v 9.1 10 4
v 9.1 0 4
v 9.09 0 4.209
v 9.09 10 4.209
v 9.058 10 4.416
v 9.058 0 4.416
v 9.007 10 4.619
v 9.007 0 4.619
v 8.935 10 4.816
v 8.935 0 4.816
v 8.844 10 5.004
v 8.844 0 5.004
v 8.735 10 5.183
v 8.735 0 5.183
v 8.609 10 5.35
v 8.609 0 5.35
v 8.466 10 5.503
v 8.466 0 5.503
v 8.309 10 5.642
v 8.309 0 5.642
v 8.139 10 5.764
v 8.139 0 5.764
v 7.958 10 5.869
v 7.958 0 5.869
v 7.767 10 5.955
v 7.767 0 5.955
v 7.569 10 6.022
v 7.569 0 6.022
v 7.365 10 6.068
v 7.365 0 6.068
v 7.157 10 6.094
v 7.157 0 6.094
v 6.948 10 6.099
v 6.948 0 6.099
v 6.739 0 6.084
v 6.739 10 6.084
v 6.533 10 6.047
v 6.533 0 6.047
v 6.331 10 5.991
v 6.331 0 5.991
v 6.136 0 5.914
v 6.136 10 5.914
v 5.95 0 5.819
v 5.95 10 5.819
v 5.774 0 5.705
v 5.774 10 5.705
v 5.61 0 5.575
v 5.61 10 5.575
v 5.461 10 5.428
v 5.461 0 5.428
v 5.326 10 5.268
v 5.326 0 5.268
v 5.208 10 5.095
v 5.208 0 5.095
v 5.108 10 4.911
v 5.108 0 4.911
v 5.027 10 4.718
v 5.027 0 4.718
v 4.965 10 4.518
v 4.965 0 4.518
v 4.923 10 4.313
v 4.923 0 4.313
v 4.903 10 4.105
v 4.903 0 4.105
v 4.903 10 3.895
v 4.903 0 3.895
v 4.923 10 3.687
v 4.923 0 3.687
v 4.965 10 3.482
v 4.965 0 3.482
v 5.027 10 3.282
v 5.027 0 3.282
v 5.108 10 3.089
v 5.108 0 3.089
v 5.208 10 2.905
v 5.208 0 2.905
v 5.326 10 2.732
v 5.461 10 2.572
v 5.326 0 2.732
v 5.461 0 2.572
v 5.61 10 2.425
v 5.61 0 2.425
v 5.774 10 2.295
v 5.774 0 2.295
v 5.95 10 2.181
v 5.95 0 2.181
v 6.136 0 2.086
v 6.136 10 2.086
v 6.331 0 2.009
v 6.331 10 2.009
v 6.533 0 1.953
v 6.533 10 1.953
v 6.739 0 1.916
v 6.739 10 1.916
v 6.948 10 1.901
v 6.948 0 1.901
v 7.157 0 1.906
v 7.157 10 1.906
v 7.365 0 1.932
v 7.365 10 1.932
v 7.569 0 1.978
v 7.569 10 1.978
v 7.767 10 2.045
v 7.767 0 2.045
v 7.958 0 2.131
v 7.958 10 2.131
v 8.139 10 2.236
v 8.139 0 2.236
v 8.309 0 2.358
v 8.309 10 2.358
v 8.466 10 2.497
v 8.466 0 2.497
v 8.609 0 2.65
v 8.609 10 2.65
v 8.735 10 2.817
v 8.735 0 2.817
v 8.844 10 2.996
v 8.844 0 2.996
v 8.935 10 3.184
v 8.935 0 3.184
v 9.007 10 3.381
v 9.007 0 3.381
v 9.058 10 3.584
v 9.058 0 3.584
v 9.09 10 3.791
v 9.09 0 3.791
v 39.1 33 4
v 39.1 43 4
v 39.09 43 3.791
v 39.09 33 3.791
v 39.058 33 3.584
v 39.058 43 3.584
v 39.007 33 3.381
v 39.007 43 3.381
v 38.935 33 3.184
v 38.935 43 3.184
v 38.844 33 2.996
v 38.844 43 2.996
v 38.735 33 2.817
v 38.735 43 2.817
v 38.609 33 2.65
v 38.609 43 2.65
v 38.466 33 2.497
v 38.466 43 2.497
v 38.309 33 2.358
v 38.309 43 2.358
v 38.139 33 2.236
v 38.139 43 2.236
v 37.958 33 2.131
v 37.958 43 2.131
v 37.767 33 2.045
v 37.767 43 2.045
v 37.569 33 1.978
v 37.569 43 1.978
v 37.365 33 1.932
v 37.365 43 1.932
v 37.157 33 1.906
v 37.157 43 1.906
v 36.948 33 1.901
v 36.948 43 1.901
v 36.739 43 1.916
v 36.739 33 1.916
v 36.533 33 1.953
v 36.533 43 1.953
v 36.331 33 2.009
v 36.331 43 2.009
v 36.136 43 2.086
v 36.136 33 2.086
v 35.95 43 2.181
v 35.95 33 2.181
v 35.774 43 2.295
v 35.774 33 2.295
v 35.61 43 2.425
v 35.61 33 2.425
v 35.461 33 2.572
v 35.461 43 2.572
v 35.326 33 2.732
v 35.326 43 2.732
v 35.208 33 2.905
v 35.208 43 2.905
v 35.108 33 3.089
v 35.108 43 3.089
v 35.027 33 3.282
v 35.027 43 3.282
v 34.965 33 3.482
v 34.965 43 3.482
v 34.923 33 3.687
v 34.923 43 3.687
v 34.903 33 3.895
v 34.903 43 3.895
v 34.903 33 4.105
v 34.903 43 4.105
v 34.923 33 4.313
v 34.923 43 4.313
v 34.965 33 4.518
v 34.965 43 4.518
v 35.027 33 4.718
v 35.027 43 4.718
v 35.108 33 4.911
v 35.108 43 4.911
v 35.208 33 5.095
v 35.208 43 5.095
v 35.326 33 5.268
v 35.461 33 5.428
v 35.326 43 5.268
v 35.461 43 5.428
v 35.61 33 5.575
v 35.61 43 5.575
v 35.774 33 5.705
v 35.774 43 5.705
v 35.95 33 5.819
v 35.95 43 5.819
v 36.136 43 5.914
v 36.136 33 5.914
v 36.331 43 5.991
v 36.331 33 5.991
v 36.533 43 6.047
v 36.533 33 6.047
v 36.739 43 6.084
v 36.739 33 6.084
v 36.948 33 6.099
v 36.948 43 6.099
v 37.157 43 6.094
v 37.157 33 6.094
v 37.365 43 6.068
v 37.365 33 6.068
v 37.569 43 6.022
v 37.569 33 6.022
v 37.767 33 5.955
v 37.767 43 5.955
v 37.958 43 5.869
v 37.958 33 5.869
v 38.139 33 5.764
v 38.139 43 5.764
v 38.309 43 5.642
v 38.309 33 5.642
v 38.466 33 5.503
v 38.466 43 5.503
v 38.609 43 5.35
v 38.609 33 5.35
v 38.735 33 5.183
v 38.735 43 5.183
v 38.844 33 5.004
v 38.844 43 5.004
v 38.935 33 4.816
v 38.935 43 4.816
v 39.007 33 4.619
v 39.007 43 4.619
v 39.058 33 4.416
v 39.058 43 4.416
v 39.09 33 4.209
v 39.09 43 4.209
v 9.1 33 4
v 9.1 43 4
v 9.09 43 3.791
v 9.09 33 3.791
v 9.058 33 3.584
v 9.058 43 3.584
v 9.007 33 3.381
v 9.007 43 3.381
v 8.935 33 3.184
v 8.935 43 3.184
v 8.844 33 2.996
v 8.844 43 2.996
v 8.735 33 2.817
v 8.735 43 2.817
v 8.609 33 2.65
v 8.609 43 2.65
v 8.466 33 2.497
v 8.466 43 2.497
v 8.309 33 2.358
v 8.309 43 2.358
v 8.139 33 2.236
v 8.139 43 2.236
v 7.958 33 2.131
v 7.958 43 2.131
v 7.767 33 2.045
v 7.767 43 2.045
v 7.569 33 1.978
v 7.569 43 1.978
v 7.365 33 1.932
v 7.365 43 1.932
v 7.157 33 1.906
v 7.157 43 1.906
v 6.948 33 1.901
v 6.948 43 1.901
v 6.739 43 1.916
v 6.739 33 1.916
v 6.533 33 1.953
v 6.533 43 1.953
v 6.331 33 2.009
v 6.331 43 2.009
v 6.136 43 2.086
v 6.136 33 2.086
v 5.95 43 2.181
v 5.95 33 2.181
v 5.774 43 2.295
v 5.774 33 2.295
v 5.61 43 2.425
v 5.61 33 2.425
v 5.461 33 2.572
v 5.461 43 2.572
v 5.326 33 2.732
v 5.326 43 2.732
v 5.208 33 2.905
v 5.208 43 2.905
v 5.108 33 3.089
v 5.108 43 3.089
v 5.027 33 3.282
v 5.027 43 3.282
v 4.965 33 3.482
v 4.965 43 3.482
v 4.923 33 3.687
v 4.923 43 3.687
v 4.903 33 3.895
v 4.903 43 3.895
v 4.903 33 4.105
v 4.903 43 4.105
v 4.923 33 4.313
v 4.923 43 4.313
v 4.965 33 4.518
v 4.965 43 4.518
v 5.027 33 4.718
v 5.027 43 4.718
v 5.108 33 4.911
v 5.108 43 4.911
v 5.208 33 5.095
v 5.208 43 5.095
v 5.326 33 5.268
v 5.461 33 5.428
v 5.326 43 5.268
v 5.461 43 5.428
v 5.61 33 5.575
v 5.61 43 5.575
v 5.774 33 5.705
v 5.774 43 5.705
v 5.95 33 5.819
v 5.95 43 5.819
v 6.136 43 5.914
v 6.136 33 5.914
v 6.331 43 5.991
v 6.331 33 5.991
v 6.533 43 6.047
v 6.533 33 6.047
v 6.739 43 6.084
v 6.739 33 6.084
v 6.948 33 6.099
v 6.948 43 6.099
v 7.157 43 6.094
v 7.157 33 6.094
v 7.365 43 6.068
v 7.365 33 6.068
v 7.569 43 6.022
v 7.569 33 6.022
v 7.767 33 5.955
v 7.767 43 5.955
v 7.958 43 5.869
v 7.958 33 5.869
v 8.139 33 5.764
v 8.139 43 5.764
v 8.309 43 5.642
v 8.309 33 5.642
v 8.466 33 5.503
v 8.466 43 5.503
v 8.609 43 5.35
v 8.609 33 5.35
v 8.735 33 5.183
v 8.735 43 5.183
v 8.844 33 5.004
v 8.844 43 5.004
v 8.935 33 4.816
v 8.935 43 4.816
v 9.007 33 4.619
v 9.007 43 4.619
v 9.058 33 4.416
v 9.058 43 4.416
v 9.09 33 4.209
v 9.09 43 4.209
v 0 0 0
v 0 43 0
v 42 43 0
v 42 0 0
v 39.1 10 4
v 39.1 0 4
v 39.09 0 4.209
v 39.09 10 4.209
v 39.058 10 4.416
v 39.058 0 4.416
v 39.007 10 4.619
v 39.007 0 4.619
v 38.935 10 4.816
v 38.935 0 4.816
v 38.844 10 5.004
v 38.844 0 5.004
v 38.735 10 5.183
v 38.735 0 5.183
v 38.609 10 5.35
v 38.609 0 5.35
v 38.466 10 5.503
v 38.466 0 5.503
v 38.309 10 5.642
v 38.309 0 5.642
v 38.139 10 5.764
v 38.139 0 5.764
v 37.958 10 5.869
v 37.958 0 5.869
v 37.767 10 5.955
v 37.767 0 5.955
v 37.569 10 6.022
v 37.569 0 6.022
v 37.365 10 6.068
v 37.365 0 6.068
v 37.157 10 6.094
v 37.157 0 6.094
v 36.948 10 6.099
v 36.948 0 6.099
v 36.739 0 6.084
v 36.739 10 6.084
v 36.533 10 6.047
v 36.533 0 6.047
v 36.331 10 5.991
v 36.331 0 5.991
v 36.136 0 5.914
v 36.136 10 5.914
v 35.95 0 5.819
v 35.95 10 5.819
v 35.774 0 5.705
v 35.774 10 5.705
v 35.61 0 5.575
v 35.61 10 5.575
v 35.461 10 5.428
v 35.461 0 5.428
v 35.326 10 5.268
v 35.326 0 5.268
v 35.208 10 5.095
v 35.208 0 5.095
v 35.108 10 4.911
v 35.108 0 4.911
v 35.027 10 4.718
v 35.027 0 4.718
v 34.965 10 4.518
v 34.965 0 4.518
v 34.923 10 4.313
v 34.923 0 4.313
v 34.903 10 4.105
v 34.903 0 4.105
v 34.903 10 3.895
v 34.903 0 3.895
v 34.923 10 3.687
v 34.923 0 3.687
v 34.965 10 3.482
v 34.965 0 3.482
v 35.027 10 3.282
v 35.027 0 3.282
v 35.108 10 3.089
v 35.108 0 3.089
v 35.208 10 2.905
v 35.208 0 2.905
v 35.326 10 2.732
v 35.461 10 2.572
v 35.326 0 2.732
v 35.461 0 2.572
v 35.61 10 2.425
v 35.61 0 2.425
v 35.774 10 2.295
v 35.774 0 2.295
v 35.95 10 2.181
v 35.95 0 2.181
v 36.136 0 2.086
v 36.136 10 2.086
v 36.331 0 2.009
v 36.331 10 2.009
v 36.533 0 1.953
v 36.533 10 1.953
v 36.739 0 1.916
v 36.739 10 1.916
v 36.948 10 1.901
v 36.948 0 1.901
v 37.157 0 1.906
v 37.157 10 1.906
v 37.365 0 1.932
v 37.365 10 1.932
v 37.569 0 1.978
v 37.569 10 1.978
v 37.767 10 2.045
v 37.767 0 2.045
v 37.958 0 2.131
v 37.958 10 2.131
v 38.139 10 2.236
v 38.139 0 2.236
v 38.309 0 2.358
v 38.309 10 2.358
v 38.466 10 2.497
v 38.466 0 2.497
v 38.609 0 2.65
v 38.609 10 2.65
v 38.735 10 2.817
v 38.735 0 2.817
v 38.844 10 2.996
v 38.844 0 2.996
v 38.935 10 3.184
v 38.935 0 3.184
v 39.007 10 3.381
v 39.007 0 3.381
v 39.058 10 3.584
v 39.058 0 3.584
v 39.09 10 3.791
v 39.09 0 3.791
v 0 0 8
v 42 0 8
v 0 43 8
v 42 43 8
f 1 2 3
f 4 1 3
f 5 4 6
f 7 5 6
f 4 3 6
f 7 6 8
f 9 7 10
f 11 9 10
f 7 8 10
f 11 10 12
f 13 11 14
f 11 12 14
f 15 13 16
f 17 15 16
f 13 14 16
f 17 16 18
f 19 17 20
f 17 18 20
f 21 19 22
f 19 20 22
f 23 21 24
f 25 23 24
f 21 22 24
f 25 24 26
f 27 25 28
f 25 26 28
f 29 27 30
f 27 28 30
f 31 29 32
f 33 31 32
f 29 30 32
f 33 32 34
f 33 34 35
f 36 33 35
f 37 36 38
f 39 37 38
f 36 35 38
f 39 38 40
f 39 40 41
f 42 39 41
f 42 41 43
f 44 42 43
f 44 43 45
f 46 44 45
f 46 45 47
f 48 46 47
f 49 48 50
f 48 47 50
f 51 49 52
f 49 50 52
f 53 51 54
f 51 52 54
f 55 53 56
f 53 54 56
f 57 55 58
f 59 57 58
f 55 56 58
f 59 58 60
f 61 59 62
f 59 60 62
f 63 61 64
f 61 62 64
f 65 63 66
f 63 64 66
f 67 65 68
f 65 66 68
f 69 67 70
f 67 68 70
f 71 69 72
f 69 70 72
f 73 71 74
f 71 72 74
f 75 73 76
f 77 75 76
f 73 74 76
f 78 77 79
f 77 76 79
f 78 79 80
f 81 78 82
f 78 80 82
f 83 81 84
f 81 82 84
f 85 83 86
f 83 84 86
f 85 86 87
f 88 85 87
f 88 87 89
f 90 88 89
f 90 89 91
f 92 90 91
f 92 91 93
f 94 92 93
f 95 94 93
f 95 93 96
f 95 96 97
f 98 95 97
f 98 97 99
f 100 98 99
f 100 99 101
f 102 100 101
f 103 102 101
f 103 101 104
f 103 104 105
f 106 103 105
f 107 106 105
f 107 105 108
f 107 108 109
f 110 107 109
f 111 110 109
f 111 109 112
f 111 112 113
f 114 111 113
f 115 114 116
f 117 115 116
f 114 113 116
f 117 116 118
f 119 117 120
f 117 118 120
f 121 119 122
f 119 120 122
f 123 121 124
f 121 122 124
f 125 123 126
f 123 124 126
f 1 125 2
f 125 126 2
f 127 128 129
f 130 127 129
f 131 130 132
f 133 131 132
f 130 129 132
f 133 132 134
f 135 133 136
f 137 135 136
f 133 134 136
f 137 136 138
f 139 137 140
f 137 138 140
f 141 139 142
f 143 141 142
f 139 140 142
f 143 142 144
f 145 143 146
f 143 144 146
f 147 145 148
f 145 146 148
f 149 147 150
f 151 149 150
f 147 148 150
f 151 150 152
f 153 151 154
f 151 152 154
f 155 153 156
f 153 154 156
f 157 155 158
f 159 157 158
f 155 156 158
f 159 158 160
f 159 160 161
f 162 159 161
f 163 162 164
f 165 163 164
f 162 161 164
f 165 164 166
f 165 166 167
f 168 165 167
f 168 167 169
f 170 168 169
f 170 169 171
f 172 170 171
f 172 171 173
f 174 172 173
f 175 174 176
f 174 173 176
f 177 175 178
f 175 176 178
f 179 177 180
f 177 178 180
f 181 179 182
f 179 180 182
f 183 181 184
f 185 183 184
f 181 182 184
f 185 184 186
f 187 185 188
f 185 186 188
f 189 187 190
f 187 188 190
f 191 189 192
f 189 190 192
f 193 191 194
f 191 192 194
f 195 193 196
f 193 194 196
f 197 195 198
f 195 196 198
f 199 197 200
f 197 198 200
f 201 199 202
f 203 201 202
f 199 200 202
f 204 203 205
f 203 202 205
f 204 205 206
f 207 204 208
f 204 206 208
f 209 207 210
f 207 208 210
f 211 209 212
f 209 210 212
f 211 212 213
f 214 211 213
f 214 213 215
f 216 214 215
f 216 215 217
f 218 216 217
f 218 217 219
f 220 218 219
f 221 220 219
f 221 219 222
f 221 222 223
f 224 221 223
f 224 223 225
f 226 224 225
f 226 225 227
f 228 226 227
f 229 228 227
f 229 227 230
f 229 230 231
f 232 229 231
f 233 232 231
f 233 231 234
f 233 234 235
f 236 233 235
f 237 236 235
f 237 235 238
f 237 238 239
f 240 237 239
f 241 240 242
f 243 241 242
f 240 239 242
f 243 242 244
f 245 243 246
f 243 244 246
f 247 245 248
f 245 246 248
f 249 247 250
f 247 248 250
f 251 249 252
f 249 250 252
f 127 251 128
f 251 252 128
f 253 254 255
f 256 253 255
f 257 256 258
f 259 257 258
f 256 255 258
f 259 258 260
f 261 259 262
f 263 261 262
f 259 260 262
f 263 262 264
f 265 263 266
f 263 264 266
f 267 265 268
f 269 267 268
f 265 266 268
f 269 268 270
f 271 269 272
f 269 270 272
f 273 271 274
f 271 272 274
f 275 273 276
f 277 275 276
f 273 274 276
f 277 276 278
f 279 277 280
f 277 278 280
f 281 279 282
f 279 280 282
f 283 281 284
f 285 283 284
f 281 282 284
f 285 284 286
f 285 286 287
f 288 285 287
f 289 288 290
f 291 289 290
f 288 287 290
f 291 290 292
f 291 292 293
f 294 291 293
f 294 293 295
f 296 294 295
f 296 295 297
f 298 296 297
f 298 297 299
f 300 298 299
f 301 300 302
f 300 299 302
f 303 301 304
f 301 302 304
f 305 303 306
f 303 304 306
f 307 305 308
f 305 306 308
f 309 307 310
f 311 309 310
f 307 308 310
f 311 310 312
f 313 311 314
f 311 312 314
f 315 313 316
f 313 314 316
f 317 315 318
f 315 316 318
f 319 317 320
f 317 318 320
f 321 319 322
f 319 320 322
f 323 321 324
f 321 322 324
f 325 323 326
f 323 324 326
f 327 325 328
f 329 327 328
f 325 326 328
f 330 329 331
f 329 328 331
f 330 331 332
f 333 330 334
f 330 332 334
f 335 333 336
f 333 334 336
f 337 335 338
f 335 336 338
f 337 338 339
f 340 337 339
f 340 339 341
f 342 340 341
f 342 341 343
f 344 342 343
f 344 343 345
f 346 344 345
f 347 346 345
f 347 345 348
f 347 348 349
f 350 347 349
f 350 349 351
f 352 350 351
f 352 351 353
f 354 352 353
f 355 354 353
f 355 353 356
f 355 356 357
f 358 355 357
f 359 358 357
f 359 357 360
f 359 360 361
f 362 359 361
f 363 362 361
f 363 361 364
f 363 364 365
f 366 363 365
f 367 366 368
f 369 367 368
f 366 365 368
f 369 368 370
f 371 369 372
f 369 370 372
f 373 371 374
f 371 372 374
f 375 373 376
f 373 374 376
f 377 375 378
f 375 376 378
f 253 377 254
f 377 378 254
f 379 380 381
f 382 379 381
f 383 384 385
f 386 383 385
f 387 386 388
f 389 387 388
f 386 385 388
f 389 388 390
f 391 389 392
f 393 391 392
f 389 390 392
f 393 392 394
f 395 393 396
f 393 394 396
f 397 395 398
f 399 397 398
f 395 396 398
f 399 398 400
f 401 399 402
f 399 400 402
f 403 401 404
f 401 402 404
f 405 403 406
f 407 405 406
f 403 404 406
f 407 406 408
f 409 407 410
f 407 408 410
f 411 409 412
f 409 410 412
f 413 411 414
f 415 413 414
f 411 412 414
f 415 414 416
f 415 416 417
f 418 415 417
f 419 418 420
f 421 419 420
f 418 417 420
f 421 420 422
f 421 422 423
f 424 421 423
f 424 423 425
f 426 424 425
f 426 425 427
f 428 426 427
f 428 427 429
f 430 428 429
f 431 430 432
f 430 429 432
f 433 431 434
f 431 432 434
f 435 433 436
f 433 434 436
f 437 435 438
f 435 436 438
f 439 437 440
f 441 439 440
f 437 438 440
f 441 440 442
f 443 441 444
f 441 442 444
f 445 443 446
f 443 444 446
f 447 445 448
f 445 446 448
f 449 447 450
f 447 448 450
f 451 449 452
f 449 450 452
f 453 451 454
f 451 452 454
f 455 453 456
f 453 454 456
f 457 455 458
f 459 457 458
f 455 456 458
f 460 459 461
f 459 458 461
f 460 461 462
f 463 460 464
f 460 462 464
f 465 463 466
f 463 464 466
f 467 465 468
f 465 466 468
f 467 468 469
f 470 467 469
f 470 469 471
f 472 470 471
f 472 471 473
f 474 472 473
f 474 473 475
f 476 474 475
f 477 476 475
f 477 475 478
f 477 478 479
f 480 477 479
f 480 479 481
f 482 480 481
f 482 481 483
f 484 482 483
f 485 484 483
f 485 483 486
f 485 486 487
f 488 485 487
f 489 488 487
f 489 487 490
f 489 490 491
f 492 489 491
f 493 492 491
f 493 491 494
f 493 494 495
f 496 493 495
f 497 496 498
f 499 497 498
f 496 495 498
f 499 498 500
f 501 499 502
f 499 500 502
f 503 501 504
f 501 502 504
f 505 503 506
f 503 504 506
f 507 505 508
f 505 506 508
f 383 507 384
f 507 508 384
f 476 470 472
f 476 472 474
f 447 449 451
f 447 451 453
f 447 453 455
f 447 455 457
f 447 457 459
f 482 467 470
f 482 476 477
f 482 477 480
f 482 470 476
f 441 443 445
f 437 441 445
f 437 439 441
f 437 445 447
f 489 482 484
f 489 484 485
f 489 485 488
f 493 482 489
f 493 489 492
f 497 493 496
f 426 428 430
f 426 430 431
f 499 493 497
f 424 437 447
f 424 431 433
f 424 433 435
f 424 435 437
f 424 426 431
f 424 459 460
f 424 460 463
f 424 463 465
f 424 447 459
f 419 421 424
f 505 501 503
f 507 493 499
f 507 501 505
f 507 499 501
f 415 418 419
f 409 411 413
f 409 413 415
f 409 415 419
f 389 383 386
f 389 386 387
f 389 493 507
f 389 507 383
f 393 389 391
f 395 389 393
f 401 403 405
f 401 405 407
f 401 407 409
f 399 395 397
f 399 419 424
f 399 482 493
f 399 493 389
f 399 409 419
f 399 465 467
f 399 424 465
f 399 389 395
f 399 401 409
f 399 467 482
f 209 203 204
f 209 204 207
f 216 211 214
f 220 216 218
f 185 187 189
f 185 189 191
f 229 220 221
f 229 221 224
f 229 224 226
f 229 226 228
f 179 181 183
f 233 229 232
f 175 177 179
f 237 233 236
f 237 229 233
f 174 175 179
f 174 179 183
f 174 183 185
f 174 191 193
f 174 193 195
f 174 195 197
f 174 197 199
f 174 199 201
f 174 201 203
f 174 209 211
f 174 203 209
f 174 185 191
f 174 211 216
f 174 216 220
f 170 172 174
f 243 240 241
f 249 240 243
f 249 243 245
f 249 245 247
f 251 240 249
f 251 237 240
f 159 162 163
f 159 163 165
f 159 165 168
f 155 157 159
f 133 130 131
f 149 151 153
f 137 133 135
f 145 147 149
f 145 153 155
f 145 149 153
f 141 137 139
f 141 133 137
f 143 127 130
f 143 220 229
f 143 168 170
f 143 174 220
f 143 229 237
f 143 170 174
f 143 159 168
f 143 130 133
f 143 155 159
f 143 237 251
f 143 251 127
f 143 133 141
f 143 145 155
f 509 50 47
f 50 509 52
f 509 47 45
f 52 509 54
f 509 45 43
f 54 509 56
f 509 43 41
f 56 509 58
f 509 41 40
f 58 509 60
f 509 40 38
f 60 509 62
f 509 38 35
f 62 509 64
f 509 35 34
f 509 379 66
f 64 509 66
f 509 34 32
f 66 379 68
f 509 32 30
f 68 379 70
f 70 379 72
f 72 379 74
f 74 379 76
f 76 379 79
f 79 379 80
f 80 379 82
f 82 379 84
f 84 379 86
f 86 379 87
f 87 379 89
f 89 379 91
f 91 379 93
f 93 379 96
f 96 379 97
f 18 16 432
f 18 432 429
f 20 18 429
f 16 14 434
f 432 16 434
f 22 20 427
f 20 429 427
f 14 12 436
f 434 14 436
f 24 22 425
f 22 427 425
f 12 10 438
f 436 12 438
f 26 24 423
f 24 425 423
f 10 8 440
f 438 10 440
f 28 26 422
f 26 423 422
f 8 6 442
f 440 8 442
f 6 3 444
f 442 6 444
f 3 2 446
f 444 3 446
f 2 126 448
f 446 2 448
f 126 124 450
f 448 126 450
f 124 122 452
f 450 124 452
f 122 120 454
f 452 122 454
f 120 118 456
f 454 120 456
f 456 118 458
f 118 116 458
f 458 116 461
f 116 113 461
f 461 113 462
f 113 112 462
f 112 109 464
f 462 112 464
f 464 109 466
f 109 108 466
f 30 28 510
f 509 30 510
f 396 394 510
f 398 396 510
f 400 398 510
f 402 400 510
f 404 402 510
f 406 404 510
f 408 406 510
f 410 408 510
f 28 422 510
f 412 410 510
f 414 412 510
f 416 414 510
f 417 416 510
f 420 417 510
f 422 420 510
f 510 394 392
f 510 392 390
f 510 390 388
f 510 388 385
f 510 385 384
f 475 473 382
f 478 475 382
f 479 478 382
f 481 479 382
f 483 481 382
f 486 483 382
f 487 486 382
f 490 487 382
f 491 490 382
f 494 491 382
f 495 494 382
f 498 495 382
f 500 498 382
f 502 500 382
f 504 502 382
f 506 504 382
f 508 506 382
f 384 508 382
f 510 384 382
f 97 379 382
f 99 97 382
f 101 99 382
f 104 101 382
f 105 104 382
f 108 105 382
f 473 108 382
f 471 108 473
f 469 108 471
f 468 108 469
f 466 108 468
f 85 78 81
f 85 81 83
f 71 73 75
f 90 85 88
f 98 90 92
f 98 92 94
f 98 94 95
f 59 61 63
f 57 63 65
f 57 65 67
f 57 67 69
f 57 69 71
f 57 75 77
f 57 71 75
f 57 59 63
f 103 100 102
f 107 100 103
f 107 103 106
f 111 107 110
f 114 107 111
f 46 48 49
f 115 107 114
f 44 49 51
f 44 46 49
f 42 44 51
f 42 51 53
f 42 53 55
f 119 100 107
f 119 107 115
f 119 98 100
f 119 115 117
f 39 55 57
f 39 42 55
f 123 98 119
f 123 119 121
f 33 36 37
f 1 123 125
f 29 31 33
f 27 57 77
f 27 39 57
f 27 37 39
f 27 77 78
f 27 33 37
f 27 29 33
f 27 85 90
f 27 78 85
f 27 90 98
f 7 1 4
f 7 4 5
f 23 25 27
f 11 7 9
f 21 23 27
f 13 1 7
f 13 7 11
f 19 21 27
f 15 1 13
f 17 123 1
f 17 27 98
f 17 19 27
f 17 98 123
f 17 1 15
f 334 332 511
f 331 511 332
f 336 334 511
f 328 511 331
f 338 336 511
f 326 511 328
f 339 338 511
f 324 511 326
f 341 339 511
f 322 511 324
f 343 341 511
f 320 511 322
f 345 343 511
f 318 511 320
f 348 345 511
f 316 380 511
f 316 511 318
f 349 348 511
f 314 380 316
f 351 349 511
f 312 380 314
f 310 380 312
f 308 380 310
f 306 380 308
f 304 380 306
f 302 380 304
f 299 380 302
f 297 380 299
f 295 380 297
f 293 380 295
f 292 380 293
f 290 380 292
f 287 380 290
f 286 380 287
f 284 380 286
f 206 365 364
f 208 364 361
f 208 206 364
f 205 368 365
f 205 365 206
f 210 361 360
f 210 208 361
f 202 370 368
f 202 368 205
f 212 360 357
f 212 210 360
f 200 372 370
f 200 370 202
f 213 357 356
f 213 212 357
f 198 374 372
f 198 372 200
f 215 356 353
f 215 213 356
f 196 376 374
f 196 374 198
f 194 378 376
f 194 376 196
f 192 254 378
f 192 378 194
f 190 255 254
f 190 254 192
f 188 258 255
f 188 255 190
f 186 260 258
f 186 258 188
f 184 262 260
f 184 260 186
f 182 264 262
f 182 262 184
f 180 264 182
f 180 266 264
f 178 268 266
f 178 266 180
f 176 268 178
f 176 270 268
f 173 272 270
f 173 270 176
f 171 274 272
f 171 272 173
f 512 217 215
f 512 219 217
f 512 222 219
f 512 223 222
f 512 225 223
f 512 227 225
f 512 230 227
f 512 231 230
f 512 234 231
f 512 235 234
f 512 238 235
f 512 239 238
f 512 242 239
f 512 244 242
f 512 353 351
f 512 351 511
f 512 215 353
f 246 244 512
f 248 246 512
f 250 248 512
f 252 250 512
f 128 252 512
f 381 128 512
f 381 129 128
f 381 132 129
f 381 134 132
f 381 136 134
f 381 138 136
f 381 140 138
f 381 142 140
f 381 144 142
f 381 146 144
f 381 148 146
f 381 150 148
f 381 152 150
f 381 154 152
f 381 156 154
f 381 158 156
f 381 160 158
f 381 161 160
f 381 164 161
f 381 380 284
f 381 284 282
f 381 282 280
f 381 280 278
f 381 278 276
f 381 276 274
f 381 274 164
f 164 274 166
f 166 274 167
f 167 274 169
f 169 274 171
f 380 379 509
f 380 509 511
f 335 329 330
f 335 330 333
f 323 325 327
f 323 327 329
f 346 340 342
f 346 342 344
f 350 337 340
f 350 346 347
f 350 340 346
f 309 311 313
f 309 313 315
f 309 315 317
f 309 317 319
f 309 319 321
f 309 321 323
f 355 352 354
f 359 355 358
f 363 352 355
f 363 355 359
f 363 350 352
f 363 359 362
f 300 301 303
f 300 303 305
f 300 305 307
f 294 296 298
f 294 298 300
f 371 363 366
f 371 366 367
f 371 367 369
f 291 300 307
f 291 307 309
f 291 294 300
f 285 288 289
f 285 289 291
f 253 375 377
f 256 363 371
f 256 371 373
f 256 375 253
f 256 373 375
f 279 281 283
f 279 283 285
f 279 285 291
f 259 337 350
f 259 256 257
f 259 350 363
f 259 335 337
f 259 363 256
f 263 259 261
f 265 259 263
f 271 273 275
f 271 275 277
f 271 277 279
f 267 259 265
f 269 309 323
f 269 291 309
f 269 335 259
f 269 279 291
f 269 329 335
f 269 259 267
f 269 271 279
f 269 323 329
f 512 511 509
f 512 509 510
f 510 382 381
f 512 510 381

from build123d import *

# Parameters (mm, degrees)
SKETCH1_W           = 42
SKETCH1_H           = 43
BOSS_EXTRUDE1_DEPTH = 8
SKETCH2_R           = 2.1
CUT_EXTRUDE1_DEPTH  = 10
SKETCH3_R           = 2.1
CUT_EXTRUDE2_DEPTH  = 10


with BuildPart() as part:
    # Sketch1 → Boss-Extrude1 (new body)
    with BuildSketch(Plane.XY):
        with Locations((21, 21.5)):
            Rectangle(SKETCH1_W, SKETCH1_H)
    extrude(amount=BOSS_EXTRUDE1_DEPTH)

    # Sketch2 → Cut-Extrude1 (cut)
    with BuildSketch(Plane.XZ):
        with Locations((37, 4)):
            Circle(SKETCH2_R)
        with Locations((7, 4)):
            Circle(SKETCH2_R)
    extrude(amount=-CUT_EXTRUDE1_DEPTH, mode=Mode.SUBTRACT)

    # Sketch3 → Cut-Extrude2 (cut)
    with BuildSketch(Plane(origin=(0, 43, 0), x_dir=(1, 0, 0), z_dir=(0, 1, 0))):
        with Locations((37, -4)):
            Circle(SKETCH3_R)
        with Locations((7, -4)):
            Circle(SKETCH3_R)
    extrude(amount=-CUT_EXTRUDE2_DEPTH, mode=Mode.SUBTRACT)


solid = part.part
